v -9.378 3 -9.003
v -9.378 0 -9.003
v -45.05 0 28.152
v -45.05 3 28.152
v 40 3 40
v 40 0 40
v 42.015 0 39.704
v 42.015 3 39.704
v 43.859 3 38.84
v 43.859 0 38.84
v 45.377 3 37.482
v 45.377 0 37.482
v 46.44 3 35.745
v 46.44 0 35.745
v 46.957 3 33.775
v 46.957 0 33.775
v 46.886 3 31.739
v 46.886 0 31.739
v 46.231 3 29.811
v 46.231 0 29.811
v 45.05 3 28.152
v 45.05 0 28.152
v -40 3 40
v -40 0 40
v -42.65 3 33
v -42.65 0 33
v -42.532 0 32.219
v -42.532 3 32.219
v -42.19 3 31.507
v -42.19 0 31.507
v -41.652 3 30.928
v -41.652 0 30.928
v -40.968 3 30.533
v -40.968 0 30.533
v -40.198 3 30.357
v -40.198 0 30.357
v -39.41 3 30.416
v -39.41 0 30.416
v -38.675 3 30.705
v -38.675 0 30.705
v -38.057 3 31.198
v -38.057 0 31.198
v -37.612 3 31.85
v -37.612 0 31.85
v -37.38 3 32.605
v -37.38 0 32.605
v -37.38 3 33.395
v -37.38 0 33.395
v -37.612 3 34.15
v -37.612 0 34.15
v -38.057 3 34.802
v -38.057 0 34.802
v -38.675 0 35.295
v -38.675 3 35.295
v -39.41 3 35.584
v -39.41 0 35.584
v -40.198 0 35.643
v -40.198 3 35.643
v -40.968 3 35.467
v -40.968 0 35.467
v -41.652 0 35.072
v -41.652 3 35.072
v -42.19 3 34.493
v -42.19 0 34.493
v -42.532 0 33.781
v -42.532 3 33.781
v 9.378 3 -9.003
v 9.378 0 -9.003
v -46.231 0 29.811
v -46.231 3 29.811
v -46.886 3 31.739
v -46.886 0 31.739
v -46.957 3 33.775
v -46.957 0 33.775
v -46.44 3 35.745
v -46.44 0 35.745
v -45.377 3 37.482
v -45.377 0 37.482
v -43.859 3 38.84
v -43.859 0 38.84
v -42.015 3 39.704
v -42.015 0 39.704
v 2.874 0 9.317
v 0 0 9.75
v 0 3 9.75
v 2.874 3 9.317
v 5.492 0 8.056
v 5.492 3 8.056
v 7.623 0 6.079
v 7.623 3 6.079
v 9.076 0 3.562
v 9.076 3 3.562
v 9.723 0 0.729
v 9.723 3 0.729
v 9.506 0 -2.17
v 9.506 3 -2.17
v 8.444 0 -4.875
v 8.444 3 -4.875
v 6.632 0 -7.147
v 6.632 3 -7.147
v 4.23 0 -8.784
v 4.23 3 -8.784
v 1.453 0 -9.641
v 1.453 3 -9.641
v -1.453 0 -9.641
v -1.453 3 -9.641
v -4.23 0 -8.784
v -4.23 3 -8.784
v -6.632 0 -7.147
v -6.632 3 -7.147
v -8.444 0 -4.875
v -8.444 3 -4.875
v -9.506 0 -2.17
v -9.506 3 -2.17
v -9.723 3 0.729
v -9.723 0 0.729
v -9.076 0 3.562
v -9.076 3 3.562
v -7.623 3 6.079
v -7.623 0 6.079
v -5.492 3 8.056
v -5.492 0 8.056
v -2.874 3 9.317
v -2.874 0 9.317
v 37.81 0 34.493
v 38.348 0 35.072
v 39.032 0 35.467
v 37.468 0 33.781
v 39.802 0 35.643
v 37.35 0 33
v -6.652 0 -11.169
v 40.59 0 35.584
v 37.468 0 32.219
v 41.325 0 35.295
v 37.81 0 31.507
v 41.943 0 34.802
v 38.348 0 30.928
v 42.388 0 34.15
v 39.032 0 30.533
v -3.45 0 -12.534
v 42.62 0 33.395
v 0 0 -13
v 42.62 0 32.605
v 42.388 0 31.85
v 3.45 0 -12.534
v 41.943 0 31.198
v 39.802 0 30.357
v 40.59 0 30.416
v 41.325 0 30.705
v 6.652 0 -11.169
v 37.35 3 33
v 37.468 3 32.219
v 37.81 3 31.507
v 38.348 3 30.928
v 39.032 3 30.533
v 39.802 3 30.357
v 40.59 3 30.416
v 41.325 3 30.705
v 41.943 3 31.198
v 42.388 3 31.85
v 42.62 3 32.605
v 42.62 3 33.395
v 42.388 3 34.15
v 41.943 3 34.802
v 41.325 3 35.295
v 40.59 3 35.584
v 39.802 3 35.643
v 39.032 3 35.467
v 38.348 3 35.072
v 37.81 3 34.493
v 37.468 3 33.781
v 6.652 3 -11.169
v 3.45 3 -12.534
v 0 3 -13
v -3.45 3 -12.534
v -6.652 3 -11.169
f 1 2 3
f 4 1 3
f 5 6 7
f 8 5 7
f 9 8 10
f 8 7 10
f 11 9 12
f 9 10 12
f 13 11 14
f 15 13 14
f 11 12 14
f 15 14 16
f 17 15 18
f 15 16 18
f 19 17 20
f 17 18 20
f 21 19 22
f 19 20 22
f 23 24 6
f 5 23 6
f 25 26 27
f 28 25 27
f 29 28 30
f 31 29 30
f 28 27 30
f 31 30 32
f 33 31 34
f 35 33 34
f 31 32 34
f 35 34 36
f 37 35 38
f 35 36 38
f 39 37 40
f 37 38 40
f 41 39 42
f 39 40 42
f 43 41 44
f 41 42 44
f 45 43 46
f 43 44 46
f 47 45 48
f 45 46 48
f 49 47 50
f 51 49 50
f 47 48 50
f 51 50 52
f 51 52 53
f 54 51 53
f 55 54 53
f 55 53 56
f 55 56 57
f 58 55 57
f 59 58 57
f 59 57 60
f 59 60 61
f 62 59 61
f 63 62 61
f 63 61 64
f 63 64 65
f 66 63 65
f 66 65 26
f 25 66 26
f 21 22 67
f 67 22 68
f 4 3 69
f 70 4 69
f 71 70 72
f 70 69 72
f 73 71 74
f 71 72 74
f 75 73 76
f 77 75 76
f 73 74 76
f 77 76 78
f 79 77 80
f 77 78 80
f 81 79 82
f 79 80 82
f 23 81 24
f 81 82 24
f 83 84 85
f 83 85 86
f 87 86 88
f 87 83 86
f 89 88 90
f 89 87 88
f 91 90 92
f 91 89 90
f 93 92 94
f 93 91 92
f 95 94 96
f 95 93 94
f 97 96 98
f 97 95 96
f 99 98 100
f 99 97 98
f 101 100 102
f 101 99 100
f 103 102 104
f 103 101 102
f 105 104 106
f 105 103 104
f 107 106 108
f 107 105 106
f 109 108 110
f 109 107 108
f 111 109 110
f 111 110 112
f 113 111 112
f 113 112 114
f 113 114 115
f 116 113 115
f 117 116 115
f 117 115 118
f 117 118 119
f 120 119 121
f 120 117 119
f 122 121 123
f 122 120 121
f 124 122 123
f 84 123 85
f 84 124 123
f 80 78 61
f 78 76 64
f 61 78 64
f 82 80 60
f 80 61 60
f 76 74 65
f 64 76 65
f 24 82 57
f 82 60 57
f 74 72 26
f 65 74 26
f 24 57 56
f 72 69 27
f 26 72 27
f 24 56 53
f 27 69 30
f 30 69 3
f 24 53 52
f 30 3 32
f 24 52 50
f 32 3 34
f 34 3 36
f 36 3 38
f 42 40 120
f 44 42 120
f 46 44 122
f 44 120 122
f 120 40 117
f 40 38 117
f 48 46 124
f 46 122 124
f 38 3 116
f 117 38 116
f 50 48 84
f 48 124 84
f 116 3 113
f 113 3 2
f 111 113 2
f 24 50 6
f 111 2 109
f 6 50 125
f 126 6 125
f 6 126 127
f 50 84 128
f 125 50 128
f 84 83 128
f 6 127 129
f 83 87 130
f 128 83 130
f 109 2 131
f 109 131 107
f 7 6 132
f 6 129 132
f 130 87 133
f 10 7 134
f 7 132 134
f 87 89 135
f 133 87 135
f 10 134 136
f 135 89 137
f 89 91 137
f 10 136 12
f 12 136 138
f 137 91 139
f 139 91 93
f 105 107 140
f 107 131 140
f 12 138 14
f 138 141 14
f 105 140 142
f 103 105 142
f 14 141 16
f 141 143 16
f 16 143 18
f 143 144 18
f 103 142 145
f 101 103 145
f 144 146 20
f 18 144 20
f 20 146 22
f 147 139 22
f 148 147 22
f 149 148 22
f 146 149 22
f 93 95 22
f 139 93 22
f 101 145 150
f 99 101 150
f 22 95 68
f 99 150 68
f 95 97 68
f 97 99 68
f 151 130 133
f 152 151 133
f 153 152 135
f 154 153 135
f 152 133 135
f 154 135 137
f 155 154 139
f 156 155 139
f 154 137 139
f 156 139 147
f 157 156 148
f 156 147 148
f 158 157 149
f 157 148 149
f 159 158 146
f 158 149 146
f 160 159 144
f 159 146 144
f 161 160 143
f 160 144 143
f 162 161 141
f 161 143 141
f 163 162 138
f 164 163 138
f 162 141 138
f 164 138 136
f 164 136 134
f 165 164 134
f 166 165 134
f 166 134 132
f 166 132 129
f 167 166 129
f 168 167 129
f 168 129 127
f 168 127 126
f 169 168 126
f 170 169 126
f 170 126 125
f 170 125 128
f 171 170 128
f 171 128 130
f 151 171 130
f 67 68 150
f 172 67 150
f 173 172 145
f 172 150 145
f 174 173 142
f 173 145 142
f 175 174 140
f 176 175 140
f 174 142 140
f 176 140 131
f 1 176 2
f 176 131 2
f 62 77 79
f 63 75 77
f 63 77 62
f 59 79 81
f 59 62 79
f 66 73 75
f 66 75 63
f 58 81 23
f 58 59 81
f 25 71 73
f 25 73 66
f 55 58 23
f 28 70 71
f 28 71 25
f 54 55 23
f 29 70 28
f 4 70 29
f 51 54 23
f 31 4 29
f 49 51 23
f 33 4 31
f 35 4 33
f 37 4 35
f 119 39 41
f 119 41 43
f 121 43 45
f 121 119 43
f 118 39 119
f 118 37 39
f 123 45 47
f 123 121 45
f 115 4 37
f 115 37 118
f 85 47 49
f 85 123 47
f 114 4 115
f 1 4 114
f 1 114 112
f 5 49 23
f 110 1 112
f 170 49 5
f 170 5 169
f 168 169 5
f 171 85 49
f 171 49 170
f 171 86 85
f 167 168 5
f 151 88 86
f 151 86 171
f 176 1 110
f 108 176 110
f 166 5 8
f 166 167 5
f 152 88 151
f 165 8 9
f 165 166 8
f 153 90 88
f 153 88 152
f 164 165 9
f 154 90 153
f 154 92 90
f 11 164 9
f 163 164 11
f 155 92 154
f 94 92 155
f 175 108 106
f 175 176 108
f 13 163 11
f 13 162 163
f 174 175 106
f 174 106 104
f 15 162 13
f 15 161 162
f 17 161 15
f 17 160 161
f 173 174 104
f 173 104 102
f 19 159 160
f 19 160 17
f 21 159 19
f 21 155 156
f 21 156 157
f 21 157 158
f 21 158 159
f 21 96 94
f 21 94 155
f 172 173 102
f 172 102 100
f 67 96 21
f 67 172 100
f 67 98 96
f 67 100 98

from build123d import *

# Parameters (mm, degrees)
SKETCH1_R            = 9.75
BOSS_EXTRUDE1_DEPTH  = 3
M5_CLEARANCE_HOLE1_D = 5.3


with BuildPart() as part:
    # Sketch1 → Boss-Extrude1 (new body)
    with BuildSketch(Plane(origin=(0, 0, 0), x_dir=(1, 0, 0), z_dir=(0, 1, 0))):
        with BuildLine():
            Line((-9.377695636, 9.003267438), (-45.049528419, -28.152086764))
            ThreePointArc((-45.049528419, -28.152086764), (-46.439541624, -35.744504268), (-40, -40))
            Line((-40, -40), (40, -40))
            ThreePointArc((40, -40), (46.439541624, -35.744504268), (45.049528419, -28.152086764))
            Line((45.049528419, -28.152086764), (9.377695636, 9.003267438))
            ThreePointArc((9.377695636, 9.003267438), (0, 13), (-9.377695636, 9.003267438))
        make_face()
        with Locations(Location((0, 0, 0), (0, 0, 270))):
            Circle(SKETCH1_R, mode=Mode.SUBTRACT)
    extrude(amount=BOSS_EXTRUDE1_DEPTH)

    # M5 Clearance Hole1 (through all)
    with Locations(Plane(origin=(0, 3, 0), x_dir=(1, 0, 0), z_dir=(0, 1, 0))):
        with Locations((-40, -33), (40, -33)):
            Hole(M5_CLEARANCE_HOLE1_D / 2)


solid = part.part
